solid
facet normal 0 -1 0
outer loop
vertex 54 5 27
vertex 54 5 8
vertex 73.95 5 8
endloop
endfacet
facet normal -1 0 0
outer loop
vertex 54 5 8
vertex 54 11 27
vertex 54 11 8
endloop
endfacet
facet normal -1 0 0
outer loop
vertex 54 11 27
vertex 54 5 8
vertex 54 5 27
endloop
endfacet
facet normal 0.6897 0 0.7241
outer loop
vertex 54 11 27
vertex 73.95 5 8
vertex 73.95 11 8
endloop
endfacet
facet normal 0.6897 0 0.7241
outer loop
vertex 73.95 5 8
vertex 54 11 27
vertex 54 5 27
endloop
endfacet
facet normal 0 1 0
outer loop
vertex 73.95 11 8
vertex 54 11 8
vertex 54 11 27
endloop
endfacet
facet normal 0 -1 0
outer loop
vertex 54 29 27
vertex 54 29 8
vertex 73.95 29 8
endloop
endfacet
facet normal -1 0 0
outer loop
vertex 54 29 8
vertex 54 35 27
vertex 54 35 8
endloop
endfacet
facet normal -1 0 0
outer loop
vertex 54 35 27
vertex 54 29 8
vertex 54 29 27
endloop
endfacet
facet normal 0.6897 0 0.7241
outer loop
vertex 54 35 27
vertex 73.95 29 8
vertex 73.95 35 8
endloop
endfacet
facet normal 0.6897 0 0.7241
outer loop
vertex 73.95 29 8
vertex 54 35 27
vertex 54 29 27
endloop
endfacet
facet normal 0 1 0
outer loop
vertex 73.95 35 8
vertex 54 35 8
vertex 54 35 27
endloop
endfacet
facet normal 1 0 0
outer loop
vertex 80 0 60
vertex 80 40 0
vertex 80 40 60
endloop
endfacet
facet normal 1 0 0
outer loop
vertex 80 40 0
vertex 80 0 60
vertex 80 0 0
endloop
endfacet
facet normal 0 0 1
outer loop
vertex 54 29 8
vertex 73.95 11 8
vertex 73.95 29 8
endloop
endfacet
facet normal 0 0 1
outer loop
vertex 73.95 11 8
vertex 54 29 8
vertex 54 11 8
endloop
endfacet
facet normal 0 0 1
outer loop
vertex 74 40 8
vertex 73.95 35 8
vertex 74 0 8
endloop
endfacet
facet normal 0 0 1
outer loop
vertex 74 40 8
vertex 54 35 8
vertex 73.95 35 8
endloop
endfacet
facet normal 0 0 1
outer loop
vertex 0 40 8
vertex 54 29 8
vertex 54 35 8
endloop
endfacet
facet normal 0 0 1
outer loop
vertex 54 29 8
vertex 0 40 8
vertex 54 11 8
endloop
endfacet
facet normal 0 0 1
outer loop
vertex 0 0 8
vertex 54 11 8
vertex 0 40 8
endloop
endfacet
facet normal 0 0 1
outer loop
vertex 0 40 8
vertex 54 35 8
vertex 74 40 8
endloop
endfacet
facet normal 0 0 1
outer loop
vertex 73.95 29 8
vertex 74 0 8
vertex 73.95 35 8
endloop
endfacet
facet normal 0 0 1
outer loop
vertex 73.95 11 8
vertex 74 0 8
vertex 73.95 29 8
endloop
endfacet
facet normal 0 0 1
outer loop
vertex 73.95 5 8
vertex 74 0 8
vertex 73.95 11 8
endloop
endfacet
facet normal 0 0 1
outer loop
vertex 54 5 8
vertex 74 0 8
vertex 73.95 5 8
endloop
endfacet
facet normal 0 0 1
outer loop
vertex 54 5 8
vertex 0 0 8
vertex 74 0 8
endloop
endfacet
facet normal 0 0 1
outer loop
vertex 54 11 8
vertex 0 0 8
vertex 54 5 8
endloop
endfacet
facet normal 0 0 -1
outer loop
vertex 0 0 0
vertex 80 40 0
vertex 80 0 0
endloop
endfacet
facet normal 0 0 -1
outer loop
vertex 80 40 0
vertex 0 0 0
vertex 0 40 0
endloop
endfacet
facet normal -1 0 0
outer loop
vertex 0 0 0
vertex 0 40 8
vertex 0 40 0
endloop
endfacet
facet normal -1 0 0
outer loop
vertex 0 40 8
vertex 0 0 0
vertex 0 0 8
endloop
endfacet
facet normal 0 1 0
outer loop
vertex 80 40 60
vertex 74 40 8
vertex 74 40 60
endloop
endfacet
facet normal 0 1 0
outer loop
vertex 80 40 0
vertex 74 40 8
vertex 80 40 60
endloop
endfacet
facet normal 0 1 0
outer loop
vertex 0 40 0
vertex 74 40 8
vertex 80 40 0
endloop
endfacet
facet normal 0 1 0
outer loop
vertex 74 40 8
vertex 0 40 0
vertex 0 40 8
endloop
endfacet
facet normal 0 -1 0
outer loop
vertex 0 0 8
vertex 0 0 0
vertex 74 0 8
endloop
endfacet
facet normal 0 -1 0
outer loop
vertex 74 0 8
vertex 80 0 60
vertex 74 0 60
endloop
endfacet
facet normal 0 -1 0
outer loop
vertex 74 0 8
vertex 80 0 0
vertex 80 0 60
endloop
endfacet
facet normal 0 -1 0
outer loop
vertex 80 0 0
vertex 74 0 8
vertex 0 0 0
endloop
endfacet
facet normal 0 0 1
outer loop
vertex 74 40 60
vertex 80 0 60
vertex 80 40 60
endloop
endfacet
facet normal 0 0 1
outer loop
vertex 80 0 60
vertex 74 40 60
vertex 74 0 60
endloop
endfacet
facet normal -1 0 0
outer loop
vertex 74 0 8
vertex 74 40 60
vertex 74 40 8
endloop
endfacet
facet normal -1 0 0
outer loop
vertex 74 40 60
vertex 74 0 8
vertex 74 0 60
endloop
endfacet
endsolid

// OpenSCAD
$fn = 32;

// ----------------------------------------------------------------------
// Rib bracket: 2-gusset L bracket
// ----------------------------------------------------------------------

// --- parameters (mm) ---
base_l = 80;              // foot length, X
base_w = 40;              // foot width, Y
base_t = 8;               // foot thickness
plate_t = 6;              // upright plate thickness
plate_h = 60;             // overall height
gus_l = 20;               // gusset leg along the foot
gus_h = 20;               // gusset height
gus_t = 6;                // gusset thickness
gus_edge = 5;             // gusset margin from the foot edge
n_gus = 2;                // gusset count

gus_pitch = (base_w - 2 * gus_edge - gus_t) / (n_gus - 1);  // gusset pitch

union() {
  cube([base_l, base_w, base_t]);
  translate([base_l - plate_t, 0, base_t - 1])
    cube([plate_t, base_w, plate_h - base_t + 1]);
  for (i = [0 : n_gus - 1])
    translate([base_l - plate_t - gus_l, gus_edge + i * gus_pitch, base_t - 1])
      rotate([-90, 0, 0])
        linear_extrude(height = gus_t)
          polygon(points = [[0, 0], [gus_l + 1, 0], [0, -gus_h]]);
}
